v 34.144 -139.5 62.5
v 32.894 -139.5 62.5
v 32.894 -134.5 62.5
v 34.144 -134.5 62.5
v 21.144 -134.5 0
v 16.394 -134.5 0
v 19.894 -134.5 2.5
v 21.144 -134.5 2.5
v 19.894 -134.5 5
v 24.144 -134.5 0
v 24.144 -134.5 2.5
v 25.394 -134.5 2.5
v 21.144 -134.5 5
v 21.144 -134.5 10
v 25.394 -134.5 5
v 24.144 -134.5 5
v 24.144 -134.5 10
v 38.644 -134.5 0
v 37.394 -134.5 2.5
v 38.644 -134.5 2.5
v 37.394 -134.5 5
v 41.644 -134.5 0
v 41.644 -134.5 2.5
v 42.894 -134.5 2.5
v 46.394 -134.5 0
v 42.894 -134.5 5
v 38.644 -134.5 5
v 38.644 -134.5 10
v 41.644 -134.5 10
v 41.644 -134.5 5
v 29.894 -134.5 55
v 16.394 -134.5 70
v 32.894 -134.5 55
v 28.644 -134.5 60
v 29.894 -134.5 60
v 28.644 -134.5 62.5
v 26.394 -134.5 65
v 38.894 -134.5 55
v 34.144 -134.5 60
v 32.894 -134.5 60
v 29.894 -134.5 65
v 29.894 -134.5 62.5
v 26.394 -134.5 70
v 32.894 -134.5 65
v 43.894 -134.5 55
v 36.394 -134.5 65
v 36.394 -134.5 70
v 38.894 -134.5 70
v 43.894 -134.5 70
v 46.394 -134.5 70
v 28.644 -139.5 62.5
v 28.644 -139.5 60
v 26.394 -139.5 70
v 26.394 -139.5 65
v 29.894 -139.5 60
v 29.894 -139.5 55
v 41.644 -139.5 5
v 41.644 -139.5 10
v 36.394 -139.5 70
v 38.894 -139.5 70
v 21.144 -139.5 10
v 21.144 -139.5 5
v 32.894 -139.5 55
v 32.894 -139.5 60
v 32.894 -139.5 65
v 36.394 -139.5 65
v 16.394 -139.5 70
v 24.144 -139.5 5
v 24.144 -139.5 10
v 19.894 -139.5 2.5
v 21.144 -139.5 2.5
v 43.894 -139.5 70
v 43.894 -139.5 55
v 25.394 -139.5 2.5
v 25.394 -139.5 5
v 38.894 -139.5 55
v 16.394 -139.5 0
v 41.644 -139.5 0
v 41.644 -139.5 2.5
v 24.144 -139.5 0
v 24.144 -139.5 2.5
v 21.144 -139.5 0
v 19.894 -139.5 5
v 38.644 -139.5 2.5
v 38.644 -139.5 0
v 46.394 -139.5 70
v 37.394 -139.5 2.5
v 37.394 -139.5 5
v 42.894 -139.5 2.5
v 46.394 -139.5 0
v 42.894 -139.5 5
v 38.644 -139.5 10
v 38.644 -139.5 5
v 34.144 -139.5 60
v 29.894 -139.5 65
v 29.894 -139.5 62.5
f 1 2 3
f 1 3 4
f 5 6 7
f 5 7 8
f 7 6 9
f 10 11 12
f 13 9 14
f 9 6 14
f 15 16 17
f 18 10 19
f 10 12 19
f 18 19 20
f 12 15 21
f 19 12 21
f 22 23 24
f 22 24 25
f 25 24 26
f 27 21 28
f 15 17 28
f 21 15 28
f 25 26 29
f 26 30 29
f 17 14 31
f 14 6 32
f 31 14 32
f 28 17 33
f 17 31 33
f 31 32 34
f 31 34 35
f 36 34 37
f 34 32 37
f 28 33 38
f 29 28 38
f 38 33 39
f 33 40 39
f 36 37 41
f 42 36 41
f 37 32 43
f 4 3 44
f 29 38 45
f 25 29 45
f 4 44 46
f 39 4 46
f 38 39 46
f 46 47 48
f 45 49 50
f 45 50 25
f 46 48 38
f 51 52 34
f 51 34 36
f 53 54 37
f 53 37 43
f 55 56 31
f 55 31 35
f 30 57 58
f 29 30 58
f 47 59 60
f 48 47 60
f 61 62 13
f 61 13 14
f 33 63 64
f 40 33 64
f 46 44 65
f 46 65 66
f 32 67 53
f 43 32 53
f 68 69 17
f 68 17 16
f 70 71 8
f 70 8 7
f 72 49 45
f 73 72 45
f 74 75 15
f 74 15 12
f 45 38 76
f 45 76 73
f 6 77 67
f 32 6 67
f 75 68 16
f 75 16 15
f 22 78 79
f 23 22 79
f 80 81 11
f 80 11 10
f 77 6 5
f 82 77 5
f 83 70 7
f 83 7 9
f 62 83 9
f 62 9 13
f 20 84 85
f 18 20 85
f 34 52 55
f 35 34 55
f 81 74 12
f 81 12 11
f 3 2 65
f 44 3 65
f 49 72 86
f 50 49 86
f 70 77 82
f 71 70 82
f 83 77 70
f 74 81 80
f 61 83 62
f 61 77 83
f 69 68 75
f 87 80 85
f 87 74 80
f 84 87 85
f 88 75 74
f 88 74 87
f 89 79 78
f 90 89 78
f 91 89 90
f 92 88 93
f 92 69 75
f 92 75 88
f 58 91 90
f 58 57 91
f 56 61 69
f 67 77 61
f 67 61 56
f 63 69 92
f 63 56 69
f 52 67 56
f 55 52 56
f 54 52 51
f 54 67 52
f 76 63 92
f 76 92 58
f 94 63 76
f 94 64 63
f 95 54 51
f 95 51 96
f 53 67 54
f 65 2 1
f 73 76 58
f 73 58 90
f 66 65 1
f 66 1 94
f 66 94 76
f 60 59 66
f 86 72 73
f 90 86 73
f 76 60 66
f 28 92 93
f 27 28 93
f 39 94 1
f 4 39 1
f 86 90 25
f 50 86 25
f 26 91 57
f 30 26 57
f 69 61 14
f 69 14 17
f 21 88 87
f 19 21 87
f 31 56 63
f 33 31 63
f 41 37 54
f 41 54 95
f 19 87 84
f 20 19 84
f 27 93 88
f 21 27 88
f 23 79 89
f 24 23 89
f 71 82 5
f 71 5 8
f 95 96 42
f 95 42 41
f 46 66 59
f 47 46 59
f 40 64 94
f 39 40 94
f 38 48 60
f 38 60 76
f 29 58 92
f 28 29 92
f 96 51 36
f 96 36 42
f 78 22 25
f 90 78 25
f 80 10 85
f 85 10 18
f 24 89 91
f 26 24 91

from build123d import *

# Parameters (mm, degrees)
SKETCH1_W           = 30
SKETCH1_H           = 5
BOSS_EXTRUDE1_DEPTH = 65
CUT_EXTRUDE1_DEPTH  = 81.015043264
SKETCH3_W           = 10
SKETCH3_H           = 5
BOSS_EXTRUDE2_DEPTH = 5
SKETCH4_W           = 1.25
SKETCH4_H           = 2.5
SKETCH4_W_2         = 3
SKETCH4_H_2         = 5
CUT_EXTRUDE2_DEPTH  = 85.127327002
SKETCH5_W           = 5
SKETCH5_H           = 15
CUT_EXTRUDE3_DEPTH  = 85.127327002


with BuildPart() as part:
    # Sketch1 → Boss-Extrude1 (new body)
    with BuildSketch(Plane.XY):
        with Locations((31.394042166, -137)):
            Rectangle(SKETCH1_W, SKETCH1_H)
    extrude(amount=BOSS_EXTRUDE1_DEPTH)

    # Sketch2 → Cut-Extrude1 (cut, through all)
    with BuildSketch(Plane.XZ.offset(139.5)):
        Polygon((21.144042166, 10), (24.144042166, 10), (24.144042166, 5), (25.394042166, 5), (25.394042166, 2.5), (24.144042166, 2.5), (24.144042166, 0), (21.144042166, 0), (21.144042166, 2.5), (19.894042166, 2.5), (19.894042166, 5), (21.144042166, 5), align=None)
        Polygon((41.644042166, 10), (38.644042166, 10), (38.644042166, 5), (37.394042166, 5), (37.394042166, 2.5), (38.644042166, 2.5), (38.644042166, 0), (41.644042166, 0), (41.644042166, 2.5), (42.894042166, 2.5), (42.894042166, 5), (41.644042166, 5), align=None)
    extrude(amount=-CUT_EXTRUDE1_DEPTH, mode=Mode.SUBTRACT)

    # Sketch3 → Boss-Extrude2 (add)
    with BuildSketch(Plane.XZ.offset(139.5)):
        with Locations((21.394042166, 67.5)):
            Rectangle(SKETCH3_W, SKETCH3_H)
        with Locations((41.394042166, 67.5)):
            Rectangle(SKETCH3_W, SKETCH3_H)
    extrude(amount=-BOSS_EXTRUDE2_DEPTH)

    # Sketch4 → Cut-Extrude2 (cut, through all)
    with BuildSketch(Plane.XZ.offset(139.5)):
        with Locations((29.269042166, 61.25)):
            Rectangle(SKETCH4_W, SKETCH4_H)
        with Locations((31.394042166, 63.75)):
            Rectangle(SKETCH4_W_2, SKETCH4_H)
        with Locations((31.394042166, 61.25)):
            Rectangle(SKETCH4_W_2, SKETCH4_H)
        with Locations((31.394042166, 57.5)):
            Rectangle(SKETCH4_W_2, SKETCH4_H_2)
        with Locations((33.519042166, 61.25)):
            Rectangle(SKETCH4_W, SKETCH4_H)
    extrude(amount=-CUT_EXTRUDE2_DEPTH, mode=Mode.SUBTRACT)

    # Sketch5 → Cut-Extrude3 (cut, through all)
    with BuildSketch(Plane(origin=(0, -134.5, 0), x_dir=(1, 0, 0), z_dir=(0, 1, 0))):
        with Locations((41.394042166, -62.5)):
            Rectangle(SKETCH5_W, SKETCH5_H)
    extrude(amount=-CUT_EXTRUDE3_DEPTH, mode=Mode.SUBTRACT)


solid = part.part
